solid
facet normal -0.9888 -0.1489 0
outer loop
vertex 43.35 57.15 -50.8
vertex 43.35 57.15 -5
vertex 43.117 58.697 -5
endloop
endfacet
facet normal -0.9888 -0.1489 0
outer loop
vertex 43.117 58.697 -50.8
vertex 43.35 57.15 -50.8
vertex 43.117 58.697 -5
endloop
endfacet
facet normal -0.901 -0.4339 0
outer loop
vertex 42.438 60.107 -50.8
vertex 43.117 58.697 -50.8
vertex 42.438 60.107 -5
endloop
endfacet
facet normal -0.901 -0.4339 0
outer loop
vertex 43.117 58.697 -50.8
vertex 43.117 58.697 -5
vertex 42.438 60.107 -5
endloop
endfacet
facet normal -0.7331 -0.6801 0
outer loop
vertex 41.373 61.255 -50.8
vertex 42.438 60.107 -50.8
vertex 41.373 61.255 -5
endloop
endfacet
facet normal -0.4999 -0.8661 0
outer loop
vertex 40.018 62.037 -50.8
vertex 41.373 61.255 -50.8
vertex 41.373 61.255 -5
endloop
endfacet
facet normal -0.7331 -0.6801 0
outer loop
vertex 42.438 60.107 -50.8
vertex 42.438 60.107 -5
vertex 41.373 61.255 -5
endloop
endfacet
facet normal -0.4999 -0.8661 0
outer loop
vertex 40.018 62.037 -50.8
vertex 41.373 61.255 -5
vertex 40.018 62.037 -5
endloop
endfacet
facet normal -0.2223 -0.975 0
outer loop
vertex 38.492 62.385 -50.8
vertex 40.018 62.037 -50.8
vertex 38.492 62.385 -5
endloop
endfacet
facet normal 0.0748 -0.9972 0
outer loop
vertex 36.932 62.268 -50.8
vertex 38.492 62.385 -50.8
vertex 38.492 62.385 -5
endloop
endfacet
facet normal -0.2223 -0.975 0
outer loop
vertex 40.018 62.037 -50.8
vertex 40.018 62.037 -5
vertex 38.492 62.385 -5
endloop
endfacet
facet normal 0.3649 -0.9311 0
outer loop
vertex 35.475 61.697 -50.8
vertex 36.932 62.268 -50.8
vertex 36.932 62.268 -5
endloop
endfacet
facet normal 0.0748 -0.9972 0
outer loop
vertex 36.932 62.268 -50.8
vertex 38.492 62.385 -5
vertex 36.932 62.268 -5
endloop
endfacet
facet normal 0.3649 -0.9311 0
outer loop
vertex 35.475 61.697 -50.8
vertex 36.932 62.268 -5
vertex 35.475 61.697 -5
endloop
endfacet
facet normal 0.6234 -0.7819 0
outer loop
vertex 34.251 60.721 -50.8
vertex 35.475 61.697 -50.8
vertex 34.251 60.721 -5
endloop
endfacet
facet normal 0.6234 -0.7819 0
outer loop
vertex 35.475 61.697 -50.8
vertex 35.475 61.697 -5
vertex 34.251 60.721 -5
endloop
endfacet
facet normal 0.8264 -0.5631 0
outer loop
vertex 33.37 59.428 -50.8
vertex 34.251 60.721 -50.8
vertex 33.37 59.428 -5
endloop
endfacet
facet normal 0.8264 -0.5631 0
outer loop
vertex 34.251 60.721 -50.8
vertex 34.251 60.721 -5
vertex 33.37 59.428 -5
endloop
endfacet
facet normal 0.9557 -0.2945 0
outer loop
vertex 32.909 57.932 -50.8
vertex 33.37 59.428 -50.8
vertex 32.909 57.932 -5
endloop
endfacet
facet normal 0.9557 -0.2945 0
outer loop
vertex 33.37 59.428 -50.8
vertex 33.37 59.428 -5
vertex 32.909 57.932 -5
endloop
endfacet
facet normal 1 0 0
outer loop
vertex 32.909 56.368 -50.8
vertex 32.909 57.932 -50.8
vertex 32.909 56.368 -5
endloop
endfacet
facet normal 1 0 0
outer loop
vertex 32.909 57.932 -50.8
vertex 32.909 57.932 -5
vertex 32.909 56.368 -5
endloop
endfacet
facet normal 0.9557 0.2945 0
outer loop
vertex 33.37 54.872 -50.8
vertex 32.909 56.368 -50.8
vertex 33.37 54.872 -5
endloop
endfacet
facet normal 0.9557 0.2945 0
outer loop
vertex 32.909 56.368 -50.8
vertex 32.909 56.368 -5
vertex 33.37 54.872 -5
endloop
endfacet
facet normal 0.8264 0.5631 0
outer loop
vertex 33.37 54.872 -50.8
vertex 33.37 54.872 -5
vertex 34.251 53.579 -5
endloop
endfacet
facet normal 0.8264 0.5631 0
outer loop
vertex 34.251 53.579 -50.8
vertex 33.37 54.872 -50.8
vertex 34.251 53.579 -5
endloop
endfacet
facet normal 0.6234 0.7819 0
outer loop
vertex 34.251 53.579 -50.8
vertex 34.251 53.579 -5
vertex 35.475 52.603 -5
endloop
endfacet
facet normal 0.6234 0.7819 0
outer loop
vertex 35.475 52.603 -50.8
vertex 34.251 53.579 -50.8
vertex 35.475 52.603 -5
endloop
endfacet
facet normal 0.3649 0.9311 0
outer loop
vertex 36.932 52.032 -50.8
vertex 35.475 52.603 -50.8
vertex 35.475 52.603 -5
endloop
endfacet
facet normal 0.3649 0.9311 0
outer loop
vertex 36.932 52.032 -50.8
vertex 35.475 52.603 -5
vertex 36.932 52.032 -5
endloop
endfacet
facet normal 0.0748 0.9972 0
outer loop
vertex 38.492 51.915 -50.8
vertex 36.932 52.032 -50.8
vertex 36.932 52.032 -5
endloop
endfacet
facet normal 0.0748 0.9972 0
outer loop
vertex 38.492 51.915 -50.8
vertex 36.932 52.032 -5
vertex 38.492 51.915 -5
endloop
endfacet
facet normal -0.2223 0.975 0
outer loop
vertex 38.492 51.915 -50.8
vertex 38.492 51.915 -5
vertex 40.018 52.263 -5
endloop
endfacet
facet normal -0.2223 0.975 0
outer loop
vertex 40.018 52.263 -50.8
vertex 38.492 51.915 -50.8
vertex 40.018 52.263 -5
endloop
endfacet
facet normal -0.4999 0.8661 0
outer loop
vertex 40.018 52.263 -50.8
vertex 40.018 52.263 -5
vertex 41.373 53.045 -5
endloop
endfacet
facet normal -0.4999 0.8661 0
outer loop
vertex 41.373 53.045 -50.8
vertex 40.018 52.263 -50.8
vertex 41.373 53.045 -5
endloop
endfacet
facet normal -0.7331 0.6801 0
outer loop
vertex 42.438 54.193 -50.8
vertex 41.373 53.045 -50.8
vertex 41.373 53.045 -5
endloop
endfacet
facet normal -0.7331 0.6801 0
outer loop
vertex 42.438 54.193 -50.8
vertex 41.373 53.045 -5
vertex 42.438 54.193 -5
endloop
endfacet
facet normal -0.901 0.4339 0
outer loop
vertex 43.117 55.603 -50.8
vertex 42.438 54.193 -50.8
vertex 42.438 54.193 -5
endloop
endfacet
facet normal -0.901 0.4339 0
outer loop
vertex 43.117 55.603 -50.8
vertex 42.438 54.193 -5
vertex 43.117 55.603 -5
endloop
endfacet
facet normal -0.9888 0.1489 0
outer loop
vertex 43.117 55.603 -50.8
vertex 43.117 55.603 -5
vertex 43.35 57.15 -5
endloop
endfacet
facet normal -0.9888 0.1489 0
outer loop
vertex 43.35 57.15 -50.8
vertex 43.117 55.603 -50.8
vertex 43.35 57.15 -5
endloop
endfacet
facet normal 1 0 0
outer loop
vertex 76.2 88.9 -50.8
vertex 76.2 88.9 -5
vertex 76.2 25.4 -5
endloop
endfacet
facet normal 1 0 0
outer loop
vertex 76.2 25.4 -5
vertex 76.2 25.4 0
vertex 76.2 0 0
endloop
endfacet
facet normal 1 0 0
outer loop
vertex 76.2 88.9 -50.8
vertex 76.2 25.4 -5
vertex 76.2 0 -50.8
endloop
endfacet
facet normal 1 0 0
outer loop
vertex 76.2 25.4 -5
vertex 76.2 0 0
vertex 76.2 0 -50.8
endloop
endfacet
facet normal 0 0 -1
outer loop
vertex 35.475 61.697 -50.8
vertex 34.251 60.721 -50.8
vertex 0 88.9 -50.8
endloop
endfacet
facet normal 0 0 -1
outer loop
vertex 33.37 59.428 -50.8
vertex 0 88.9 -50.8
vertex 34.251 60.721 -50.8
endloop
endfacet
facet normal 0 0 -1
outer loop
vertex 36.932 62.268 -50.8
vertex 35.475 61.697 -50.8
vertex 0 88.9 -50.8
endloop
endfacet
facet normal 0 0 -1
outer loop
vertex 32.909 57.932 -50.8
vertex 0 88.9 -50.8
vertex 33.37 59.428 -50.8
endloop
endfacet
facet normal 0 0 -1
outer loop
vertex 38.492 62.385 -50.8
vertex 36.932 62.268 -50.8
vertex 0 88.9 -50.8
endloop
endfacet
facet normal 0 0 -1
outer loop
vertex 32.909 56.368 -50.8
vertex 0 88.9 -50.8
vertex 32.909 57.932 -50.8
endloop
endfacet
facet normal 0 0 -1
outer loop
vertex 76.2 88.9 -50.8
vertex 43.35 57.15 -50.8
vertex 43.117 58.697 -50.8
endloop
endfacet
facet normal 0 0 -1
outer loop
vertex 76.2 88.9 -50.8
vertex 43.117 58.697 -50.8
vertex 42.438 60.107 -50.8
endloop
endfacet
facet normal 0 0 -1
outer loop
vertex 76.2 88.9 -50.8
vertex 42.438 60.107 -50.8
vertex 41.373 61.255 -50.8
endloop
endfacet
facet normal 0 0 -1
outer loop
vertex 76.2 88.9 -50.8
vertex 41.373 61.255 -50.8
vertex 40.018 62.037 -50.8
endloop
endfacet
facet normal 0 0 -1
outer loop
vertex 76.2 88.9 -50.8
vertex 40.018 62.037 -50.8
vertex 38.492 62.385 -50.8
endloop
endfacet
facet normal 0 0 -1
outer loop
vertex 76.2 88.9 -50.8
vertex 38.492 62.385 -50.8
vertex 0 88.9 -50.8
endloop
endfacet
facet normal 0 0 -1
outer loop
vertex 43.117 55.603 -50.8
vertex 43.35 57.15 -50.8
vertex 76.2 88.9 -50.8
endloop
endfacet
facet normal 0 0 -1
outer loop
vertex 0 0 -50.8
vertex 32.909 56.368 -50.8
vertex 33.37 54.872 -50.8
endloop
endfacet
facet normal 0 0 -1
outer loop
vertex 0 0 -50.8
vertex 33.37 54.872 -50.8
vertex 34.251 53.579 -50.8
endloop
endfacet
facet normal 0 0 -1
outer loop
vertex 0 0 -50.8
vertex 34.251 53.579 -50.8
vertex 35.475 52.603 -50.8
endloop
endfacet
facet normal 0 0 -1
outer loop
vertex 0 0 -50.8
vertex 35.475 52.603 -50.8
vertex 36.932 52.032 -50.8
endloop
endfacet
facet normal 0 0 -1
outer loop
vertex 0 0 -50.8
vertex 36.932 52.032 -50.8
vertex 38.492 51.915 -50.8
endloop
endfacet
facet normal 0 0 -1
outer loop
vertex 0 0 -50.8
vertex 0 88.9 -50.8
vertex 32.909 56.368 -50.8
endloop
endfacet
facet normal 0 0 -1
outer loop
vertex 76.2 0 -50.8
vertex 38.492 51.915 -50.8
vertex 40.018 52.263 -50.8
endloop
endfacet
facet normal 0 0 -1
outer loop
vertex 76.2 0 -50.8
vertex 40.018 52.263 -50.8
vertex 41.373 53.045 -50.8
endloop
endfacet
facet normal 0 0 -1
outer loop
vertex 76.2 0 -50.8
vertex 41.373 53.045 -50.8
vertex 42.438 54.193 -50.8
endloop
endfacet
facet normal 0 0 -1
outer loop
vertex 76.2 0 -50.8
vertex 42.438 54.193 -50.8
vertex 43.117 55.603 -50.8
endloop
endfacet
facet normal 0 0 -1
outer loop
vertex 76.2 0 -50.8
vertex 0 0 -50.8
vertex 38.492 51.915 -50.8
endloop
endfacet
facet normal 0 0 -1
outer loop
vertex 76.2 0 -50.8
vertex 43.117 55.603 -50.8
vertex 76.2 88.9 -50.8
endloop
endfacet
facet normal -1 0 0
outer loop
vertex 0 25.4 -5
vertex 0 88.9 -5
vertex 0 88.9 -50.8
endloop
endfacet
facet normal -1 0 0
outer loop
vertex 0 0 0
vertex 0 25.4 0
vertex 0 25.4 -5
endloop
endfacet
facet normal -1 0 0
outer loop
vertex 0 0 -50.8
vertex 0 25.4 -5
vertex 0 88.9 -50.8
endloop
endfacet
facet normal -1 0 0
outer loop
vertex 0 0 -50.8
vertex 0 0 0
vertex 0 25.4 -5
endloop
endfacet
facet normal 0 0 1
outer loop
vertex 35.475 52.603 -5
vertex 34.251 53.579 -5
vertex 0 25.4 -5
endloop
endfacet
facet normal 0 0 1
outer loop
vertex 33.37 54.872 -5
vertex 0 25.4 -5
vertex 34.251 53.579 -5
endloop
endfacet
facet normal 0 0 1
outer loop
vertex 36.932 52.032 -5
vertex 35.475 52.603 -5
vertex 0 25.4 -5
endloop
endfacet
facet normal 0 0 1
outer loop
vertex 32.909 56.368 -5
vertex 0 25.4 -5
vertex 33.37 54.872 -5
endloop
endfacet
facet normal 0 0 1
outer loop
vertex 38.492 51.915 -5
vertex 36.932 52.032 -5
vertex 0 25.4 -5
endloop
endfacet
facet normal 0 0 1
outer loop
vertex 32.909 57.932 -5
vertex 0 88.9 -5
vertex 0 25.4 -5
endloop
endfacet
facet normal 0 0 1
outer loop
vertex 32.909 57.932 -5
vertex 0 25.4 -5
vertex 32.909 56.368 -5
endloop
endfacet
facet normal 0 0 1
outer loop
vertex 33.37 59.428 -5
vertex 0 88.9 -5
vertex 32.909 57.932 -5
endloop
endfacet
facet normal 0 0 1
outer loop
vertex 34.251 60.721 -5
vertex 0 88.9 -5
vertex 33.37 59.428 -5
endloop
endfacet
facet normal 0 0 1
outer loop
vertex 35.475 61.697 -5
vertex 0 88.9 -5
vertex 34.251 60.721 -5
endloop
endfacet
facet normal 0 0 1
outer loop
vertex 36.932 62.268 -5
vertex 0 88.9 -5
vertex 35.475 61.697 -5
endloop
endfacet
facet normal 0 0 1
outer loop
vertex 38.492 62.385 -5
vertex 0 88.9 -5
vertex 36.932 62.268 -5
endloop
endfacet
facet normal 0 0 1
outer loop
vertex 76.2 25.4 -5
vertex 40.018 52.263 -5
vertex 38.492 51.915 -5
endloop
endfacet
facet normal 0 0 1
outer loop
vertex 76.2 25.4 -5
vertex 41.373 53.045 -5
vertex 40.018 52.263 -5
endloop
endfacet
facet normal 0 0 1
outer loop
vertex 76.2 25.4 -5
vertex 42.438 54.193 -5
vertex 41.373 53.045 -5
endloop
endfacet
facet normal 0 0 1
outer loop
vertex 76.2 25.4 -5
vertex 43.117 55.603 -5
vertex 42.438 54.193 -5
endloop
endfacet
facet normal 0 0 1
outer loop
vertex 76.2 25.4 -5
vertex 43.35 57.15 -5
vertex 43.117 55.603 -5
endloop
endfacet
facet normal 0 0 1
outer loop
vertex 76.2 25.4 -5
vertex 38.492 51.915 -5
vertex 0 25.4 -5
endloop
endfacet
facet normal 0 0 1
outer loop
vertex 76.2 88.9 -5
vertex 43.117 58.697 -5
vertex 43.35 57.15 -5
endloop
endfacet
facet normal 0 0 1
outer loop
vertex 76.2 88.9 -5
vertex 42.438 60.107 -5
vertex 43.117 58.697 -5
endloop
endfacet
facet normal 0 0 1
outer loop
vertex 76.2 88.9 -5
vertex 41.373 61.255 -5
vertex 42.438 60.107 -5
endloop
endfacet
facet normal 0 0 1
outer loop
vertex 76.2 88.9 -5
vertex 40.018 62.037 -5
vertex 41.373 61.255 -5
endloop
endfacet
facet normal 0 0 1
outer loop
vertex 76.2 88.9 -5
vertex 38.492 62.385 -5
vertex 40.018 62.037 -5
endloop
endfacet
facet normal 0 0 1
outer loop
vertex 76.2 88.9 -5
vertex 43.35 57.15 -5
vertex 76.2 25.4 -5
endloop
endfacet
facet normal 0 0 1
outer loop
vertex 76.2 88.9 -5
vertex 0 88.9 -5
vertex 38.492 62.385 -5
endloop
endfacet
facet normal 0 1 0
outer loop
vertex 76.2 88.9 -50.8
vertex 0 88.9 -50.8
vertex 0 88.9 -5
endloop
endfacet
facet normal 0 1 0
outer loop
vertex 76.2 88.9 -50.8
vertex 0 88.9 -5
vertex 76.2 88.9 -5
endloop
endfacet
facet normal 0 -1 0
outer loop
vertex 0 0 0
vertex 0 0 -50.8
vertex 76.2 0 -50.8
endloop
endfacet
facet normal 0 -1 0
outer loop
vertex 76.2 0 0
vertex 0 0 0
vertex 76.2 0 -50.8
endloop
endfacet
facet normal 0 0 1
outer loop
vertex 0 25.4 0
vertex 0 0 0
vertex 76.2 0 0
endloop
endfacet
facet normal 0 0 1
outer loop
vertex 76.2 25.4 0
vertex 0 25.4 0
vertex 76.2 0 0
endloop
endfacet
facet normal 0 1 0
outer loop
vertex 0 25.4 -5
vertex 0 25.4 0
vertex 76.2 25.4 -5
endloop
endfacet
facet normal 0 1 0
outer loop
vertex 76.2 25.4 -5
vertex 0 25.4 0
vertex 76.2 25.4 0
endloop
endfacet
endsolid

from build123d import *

# Parameters (mm, degrees)
SKETCH1_W           = 76.2
SKETCH1_H           = 50.8
BOSS_EXTRUDE1_DEPTH = 88.9
SKETCH2_R           = 5.25
CUT_EXTRUDE1_DEPTH  = 300
SKETCH3_W           = 76.2
SKETCH3_H           = 63.5
CUT_EXTRUDE2_DEPTH  = 5


with BuildPart() as part:
    # Sketch1 → Boss-Extrude1 (new body)
    with BuildSketch(Plane(origin=(0, 0, 0), x_dir=(1, 0, 0), z_dir=(0, 1, 0))):
        with Locations((38.1, 25.4)):
            Rectangle(SKETCH1_W, SKETCH1_H)
    extrude(amount=BOSS_EXTRUDE1_DEPTH)

    # Sketch2 → Cut-Extrude1 (cut)
    with BuildSketch(Plane.XY):
        with Locations((38.1, 57.15)):
            Circle(SKETCH2_R)
    extrude(amount=-CUT_EXTRUDE1_DEPTH, mode=Mode.SUBTRACT)

    # Sketch3 → Cut-Extrude2 (cut)
    with BuildSketch(Plane.XY):
        with Locations((38.1, 57.15)):
            Rectangle(SKETCH3_W, SKETCH3_H)
    extrude(amount=-CUT_EXTRUDE2_DEPTH, mode=Mode.SUBTRACT)


solid = part.part
